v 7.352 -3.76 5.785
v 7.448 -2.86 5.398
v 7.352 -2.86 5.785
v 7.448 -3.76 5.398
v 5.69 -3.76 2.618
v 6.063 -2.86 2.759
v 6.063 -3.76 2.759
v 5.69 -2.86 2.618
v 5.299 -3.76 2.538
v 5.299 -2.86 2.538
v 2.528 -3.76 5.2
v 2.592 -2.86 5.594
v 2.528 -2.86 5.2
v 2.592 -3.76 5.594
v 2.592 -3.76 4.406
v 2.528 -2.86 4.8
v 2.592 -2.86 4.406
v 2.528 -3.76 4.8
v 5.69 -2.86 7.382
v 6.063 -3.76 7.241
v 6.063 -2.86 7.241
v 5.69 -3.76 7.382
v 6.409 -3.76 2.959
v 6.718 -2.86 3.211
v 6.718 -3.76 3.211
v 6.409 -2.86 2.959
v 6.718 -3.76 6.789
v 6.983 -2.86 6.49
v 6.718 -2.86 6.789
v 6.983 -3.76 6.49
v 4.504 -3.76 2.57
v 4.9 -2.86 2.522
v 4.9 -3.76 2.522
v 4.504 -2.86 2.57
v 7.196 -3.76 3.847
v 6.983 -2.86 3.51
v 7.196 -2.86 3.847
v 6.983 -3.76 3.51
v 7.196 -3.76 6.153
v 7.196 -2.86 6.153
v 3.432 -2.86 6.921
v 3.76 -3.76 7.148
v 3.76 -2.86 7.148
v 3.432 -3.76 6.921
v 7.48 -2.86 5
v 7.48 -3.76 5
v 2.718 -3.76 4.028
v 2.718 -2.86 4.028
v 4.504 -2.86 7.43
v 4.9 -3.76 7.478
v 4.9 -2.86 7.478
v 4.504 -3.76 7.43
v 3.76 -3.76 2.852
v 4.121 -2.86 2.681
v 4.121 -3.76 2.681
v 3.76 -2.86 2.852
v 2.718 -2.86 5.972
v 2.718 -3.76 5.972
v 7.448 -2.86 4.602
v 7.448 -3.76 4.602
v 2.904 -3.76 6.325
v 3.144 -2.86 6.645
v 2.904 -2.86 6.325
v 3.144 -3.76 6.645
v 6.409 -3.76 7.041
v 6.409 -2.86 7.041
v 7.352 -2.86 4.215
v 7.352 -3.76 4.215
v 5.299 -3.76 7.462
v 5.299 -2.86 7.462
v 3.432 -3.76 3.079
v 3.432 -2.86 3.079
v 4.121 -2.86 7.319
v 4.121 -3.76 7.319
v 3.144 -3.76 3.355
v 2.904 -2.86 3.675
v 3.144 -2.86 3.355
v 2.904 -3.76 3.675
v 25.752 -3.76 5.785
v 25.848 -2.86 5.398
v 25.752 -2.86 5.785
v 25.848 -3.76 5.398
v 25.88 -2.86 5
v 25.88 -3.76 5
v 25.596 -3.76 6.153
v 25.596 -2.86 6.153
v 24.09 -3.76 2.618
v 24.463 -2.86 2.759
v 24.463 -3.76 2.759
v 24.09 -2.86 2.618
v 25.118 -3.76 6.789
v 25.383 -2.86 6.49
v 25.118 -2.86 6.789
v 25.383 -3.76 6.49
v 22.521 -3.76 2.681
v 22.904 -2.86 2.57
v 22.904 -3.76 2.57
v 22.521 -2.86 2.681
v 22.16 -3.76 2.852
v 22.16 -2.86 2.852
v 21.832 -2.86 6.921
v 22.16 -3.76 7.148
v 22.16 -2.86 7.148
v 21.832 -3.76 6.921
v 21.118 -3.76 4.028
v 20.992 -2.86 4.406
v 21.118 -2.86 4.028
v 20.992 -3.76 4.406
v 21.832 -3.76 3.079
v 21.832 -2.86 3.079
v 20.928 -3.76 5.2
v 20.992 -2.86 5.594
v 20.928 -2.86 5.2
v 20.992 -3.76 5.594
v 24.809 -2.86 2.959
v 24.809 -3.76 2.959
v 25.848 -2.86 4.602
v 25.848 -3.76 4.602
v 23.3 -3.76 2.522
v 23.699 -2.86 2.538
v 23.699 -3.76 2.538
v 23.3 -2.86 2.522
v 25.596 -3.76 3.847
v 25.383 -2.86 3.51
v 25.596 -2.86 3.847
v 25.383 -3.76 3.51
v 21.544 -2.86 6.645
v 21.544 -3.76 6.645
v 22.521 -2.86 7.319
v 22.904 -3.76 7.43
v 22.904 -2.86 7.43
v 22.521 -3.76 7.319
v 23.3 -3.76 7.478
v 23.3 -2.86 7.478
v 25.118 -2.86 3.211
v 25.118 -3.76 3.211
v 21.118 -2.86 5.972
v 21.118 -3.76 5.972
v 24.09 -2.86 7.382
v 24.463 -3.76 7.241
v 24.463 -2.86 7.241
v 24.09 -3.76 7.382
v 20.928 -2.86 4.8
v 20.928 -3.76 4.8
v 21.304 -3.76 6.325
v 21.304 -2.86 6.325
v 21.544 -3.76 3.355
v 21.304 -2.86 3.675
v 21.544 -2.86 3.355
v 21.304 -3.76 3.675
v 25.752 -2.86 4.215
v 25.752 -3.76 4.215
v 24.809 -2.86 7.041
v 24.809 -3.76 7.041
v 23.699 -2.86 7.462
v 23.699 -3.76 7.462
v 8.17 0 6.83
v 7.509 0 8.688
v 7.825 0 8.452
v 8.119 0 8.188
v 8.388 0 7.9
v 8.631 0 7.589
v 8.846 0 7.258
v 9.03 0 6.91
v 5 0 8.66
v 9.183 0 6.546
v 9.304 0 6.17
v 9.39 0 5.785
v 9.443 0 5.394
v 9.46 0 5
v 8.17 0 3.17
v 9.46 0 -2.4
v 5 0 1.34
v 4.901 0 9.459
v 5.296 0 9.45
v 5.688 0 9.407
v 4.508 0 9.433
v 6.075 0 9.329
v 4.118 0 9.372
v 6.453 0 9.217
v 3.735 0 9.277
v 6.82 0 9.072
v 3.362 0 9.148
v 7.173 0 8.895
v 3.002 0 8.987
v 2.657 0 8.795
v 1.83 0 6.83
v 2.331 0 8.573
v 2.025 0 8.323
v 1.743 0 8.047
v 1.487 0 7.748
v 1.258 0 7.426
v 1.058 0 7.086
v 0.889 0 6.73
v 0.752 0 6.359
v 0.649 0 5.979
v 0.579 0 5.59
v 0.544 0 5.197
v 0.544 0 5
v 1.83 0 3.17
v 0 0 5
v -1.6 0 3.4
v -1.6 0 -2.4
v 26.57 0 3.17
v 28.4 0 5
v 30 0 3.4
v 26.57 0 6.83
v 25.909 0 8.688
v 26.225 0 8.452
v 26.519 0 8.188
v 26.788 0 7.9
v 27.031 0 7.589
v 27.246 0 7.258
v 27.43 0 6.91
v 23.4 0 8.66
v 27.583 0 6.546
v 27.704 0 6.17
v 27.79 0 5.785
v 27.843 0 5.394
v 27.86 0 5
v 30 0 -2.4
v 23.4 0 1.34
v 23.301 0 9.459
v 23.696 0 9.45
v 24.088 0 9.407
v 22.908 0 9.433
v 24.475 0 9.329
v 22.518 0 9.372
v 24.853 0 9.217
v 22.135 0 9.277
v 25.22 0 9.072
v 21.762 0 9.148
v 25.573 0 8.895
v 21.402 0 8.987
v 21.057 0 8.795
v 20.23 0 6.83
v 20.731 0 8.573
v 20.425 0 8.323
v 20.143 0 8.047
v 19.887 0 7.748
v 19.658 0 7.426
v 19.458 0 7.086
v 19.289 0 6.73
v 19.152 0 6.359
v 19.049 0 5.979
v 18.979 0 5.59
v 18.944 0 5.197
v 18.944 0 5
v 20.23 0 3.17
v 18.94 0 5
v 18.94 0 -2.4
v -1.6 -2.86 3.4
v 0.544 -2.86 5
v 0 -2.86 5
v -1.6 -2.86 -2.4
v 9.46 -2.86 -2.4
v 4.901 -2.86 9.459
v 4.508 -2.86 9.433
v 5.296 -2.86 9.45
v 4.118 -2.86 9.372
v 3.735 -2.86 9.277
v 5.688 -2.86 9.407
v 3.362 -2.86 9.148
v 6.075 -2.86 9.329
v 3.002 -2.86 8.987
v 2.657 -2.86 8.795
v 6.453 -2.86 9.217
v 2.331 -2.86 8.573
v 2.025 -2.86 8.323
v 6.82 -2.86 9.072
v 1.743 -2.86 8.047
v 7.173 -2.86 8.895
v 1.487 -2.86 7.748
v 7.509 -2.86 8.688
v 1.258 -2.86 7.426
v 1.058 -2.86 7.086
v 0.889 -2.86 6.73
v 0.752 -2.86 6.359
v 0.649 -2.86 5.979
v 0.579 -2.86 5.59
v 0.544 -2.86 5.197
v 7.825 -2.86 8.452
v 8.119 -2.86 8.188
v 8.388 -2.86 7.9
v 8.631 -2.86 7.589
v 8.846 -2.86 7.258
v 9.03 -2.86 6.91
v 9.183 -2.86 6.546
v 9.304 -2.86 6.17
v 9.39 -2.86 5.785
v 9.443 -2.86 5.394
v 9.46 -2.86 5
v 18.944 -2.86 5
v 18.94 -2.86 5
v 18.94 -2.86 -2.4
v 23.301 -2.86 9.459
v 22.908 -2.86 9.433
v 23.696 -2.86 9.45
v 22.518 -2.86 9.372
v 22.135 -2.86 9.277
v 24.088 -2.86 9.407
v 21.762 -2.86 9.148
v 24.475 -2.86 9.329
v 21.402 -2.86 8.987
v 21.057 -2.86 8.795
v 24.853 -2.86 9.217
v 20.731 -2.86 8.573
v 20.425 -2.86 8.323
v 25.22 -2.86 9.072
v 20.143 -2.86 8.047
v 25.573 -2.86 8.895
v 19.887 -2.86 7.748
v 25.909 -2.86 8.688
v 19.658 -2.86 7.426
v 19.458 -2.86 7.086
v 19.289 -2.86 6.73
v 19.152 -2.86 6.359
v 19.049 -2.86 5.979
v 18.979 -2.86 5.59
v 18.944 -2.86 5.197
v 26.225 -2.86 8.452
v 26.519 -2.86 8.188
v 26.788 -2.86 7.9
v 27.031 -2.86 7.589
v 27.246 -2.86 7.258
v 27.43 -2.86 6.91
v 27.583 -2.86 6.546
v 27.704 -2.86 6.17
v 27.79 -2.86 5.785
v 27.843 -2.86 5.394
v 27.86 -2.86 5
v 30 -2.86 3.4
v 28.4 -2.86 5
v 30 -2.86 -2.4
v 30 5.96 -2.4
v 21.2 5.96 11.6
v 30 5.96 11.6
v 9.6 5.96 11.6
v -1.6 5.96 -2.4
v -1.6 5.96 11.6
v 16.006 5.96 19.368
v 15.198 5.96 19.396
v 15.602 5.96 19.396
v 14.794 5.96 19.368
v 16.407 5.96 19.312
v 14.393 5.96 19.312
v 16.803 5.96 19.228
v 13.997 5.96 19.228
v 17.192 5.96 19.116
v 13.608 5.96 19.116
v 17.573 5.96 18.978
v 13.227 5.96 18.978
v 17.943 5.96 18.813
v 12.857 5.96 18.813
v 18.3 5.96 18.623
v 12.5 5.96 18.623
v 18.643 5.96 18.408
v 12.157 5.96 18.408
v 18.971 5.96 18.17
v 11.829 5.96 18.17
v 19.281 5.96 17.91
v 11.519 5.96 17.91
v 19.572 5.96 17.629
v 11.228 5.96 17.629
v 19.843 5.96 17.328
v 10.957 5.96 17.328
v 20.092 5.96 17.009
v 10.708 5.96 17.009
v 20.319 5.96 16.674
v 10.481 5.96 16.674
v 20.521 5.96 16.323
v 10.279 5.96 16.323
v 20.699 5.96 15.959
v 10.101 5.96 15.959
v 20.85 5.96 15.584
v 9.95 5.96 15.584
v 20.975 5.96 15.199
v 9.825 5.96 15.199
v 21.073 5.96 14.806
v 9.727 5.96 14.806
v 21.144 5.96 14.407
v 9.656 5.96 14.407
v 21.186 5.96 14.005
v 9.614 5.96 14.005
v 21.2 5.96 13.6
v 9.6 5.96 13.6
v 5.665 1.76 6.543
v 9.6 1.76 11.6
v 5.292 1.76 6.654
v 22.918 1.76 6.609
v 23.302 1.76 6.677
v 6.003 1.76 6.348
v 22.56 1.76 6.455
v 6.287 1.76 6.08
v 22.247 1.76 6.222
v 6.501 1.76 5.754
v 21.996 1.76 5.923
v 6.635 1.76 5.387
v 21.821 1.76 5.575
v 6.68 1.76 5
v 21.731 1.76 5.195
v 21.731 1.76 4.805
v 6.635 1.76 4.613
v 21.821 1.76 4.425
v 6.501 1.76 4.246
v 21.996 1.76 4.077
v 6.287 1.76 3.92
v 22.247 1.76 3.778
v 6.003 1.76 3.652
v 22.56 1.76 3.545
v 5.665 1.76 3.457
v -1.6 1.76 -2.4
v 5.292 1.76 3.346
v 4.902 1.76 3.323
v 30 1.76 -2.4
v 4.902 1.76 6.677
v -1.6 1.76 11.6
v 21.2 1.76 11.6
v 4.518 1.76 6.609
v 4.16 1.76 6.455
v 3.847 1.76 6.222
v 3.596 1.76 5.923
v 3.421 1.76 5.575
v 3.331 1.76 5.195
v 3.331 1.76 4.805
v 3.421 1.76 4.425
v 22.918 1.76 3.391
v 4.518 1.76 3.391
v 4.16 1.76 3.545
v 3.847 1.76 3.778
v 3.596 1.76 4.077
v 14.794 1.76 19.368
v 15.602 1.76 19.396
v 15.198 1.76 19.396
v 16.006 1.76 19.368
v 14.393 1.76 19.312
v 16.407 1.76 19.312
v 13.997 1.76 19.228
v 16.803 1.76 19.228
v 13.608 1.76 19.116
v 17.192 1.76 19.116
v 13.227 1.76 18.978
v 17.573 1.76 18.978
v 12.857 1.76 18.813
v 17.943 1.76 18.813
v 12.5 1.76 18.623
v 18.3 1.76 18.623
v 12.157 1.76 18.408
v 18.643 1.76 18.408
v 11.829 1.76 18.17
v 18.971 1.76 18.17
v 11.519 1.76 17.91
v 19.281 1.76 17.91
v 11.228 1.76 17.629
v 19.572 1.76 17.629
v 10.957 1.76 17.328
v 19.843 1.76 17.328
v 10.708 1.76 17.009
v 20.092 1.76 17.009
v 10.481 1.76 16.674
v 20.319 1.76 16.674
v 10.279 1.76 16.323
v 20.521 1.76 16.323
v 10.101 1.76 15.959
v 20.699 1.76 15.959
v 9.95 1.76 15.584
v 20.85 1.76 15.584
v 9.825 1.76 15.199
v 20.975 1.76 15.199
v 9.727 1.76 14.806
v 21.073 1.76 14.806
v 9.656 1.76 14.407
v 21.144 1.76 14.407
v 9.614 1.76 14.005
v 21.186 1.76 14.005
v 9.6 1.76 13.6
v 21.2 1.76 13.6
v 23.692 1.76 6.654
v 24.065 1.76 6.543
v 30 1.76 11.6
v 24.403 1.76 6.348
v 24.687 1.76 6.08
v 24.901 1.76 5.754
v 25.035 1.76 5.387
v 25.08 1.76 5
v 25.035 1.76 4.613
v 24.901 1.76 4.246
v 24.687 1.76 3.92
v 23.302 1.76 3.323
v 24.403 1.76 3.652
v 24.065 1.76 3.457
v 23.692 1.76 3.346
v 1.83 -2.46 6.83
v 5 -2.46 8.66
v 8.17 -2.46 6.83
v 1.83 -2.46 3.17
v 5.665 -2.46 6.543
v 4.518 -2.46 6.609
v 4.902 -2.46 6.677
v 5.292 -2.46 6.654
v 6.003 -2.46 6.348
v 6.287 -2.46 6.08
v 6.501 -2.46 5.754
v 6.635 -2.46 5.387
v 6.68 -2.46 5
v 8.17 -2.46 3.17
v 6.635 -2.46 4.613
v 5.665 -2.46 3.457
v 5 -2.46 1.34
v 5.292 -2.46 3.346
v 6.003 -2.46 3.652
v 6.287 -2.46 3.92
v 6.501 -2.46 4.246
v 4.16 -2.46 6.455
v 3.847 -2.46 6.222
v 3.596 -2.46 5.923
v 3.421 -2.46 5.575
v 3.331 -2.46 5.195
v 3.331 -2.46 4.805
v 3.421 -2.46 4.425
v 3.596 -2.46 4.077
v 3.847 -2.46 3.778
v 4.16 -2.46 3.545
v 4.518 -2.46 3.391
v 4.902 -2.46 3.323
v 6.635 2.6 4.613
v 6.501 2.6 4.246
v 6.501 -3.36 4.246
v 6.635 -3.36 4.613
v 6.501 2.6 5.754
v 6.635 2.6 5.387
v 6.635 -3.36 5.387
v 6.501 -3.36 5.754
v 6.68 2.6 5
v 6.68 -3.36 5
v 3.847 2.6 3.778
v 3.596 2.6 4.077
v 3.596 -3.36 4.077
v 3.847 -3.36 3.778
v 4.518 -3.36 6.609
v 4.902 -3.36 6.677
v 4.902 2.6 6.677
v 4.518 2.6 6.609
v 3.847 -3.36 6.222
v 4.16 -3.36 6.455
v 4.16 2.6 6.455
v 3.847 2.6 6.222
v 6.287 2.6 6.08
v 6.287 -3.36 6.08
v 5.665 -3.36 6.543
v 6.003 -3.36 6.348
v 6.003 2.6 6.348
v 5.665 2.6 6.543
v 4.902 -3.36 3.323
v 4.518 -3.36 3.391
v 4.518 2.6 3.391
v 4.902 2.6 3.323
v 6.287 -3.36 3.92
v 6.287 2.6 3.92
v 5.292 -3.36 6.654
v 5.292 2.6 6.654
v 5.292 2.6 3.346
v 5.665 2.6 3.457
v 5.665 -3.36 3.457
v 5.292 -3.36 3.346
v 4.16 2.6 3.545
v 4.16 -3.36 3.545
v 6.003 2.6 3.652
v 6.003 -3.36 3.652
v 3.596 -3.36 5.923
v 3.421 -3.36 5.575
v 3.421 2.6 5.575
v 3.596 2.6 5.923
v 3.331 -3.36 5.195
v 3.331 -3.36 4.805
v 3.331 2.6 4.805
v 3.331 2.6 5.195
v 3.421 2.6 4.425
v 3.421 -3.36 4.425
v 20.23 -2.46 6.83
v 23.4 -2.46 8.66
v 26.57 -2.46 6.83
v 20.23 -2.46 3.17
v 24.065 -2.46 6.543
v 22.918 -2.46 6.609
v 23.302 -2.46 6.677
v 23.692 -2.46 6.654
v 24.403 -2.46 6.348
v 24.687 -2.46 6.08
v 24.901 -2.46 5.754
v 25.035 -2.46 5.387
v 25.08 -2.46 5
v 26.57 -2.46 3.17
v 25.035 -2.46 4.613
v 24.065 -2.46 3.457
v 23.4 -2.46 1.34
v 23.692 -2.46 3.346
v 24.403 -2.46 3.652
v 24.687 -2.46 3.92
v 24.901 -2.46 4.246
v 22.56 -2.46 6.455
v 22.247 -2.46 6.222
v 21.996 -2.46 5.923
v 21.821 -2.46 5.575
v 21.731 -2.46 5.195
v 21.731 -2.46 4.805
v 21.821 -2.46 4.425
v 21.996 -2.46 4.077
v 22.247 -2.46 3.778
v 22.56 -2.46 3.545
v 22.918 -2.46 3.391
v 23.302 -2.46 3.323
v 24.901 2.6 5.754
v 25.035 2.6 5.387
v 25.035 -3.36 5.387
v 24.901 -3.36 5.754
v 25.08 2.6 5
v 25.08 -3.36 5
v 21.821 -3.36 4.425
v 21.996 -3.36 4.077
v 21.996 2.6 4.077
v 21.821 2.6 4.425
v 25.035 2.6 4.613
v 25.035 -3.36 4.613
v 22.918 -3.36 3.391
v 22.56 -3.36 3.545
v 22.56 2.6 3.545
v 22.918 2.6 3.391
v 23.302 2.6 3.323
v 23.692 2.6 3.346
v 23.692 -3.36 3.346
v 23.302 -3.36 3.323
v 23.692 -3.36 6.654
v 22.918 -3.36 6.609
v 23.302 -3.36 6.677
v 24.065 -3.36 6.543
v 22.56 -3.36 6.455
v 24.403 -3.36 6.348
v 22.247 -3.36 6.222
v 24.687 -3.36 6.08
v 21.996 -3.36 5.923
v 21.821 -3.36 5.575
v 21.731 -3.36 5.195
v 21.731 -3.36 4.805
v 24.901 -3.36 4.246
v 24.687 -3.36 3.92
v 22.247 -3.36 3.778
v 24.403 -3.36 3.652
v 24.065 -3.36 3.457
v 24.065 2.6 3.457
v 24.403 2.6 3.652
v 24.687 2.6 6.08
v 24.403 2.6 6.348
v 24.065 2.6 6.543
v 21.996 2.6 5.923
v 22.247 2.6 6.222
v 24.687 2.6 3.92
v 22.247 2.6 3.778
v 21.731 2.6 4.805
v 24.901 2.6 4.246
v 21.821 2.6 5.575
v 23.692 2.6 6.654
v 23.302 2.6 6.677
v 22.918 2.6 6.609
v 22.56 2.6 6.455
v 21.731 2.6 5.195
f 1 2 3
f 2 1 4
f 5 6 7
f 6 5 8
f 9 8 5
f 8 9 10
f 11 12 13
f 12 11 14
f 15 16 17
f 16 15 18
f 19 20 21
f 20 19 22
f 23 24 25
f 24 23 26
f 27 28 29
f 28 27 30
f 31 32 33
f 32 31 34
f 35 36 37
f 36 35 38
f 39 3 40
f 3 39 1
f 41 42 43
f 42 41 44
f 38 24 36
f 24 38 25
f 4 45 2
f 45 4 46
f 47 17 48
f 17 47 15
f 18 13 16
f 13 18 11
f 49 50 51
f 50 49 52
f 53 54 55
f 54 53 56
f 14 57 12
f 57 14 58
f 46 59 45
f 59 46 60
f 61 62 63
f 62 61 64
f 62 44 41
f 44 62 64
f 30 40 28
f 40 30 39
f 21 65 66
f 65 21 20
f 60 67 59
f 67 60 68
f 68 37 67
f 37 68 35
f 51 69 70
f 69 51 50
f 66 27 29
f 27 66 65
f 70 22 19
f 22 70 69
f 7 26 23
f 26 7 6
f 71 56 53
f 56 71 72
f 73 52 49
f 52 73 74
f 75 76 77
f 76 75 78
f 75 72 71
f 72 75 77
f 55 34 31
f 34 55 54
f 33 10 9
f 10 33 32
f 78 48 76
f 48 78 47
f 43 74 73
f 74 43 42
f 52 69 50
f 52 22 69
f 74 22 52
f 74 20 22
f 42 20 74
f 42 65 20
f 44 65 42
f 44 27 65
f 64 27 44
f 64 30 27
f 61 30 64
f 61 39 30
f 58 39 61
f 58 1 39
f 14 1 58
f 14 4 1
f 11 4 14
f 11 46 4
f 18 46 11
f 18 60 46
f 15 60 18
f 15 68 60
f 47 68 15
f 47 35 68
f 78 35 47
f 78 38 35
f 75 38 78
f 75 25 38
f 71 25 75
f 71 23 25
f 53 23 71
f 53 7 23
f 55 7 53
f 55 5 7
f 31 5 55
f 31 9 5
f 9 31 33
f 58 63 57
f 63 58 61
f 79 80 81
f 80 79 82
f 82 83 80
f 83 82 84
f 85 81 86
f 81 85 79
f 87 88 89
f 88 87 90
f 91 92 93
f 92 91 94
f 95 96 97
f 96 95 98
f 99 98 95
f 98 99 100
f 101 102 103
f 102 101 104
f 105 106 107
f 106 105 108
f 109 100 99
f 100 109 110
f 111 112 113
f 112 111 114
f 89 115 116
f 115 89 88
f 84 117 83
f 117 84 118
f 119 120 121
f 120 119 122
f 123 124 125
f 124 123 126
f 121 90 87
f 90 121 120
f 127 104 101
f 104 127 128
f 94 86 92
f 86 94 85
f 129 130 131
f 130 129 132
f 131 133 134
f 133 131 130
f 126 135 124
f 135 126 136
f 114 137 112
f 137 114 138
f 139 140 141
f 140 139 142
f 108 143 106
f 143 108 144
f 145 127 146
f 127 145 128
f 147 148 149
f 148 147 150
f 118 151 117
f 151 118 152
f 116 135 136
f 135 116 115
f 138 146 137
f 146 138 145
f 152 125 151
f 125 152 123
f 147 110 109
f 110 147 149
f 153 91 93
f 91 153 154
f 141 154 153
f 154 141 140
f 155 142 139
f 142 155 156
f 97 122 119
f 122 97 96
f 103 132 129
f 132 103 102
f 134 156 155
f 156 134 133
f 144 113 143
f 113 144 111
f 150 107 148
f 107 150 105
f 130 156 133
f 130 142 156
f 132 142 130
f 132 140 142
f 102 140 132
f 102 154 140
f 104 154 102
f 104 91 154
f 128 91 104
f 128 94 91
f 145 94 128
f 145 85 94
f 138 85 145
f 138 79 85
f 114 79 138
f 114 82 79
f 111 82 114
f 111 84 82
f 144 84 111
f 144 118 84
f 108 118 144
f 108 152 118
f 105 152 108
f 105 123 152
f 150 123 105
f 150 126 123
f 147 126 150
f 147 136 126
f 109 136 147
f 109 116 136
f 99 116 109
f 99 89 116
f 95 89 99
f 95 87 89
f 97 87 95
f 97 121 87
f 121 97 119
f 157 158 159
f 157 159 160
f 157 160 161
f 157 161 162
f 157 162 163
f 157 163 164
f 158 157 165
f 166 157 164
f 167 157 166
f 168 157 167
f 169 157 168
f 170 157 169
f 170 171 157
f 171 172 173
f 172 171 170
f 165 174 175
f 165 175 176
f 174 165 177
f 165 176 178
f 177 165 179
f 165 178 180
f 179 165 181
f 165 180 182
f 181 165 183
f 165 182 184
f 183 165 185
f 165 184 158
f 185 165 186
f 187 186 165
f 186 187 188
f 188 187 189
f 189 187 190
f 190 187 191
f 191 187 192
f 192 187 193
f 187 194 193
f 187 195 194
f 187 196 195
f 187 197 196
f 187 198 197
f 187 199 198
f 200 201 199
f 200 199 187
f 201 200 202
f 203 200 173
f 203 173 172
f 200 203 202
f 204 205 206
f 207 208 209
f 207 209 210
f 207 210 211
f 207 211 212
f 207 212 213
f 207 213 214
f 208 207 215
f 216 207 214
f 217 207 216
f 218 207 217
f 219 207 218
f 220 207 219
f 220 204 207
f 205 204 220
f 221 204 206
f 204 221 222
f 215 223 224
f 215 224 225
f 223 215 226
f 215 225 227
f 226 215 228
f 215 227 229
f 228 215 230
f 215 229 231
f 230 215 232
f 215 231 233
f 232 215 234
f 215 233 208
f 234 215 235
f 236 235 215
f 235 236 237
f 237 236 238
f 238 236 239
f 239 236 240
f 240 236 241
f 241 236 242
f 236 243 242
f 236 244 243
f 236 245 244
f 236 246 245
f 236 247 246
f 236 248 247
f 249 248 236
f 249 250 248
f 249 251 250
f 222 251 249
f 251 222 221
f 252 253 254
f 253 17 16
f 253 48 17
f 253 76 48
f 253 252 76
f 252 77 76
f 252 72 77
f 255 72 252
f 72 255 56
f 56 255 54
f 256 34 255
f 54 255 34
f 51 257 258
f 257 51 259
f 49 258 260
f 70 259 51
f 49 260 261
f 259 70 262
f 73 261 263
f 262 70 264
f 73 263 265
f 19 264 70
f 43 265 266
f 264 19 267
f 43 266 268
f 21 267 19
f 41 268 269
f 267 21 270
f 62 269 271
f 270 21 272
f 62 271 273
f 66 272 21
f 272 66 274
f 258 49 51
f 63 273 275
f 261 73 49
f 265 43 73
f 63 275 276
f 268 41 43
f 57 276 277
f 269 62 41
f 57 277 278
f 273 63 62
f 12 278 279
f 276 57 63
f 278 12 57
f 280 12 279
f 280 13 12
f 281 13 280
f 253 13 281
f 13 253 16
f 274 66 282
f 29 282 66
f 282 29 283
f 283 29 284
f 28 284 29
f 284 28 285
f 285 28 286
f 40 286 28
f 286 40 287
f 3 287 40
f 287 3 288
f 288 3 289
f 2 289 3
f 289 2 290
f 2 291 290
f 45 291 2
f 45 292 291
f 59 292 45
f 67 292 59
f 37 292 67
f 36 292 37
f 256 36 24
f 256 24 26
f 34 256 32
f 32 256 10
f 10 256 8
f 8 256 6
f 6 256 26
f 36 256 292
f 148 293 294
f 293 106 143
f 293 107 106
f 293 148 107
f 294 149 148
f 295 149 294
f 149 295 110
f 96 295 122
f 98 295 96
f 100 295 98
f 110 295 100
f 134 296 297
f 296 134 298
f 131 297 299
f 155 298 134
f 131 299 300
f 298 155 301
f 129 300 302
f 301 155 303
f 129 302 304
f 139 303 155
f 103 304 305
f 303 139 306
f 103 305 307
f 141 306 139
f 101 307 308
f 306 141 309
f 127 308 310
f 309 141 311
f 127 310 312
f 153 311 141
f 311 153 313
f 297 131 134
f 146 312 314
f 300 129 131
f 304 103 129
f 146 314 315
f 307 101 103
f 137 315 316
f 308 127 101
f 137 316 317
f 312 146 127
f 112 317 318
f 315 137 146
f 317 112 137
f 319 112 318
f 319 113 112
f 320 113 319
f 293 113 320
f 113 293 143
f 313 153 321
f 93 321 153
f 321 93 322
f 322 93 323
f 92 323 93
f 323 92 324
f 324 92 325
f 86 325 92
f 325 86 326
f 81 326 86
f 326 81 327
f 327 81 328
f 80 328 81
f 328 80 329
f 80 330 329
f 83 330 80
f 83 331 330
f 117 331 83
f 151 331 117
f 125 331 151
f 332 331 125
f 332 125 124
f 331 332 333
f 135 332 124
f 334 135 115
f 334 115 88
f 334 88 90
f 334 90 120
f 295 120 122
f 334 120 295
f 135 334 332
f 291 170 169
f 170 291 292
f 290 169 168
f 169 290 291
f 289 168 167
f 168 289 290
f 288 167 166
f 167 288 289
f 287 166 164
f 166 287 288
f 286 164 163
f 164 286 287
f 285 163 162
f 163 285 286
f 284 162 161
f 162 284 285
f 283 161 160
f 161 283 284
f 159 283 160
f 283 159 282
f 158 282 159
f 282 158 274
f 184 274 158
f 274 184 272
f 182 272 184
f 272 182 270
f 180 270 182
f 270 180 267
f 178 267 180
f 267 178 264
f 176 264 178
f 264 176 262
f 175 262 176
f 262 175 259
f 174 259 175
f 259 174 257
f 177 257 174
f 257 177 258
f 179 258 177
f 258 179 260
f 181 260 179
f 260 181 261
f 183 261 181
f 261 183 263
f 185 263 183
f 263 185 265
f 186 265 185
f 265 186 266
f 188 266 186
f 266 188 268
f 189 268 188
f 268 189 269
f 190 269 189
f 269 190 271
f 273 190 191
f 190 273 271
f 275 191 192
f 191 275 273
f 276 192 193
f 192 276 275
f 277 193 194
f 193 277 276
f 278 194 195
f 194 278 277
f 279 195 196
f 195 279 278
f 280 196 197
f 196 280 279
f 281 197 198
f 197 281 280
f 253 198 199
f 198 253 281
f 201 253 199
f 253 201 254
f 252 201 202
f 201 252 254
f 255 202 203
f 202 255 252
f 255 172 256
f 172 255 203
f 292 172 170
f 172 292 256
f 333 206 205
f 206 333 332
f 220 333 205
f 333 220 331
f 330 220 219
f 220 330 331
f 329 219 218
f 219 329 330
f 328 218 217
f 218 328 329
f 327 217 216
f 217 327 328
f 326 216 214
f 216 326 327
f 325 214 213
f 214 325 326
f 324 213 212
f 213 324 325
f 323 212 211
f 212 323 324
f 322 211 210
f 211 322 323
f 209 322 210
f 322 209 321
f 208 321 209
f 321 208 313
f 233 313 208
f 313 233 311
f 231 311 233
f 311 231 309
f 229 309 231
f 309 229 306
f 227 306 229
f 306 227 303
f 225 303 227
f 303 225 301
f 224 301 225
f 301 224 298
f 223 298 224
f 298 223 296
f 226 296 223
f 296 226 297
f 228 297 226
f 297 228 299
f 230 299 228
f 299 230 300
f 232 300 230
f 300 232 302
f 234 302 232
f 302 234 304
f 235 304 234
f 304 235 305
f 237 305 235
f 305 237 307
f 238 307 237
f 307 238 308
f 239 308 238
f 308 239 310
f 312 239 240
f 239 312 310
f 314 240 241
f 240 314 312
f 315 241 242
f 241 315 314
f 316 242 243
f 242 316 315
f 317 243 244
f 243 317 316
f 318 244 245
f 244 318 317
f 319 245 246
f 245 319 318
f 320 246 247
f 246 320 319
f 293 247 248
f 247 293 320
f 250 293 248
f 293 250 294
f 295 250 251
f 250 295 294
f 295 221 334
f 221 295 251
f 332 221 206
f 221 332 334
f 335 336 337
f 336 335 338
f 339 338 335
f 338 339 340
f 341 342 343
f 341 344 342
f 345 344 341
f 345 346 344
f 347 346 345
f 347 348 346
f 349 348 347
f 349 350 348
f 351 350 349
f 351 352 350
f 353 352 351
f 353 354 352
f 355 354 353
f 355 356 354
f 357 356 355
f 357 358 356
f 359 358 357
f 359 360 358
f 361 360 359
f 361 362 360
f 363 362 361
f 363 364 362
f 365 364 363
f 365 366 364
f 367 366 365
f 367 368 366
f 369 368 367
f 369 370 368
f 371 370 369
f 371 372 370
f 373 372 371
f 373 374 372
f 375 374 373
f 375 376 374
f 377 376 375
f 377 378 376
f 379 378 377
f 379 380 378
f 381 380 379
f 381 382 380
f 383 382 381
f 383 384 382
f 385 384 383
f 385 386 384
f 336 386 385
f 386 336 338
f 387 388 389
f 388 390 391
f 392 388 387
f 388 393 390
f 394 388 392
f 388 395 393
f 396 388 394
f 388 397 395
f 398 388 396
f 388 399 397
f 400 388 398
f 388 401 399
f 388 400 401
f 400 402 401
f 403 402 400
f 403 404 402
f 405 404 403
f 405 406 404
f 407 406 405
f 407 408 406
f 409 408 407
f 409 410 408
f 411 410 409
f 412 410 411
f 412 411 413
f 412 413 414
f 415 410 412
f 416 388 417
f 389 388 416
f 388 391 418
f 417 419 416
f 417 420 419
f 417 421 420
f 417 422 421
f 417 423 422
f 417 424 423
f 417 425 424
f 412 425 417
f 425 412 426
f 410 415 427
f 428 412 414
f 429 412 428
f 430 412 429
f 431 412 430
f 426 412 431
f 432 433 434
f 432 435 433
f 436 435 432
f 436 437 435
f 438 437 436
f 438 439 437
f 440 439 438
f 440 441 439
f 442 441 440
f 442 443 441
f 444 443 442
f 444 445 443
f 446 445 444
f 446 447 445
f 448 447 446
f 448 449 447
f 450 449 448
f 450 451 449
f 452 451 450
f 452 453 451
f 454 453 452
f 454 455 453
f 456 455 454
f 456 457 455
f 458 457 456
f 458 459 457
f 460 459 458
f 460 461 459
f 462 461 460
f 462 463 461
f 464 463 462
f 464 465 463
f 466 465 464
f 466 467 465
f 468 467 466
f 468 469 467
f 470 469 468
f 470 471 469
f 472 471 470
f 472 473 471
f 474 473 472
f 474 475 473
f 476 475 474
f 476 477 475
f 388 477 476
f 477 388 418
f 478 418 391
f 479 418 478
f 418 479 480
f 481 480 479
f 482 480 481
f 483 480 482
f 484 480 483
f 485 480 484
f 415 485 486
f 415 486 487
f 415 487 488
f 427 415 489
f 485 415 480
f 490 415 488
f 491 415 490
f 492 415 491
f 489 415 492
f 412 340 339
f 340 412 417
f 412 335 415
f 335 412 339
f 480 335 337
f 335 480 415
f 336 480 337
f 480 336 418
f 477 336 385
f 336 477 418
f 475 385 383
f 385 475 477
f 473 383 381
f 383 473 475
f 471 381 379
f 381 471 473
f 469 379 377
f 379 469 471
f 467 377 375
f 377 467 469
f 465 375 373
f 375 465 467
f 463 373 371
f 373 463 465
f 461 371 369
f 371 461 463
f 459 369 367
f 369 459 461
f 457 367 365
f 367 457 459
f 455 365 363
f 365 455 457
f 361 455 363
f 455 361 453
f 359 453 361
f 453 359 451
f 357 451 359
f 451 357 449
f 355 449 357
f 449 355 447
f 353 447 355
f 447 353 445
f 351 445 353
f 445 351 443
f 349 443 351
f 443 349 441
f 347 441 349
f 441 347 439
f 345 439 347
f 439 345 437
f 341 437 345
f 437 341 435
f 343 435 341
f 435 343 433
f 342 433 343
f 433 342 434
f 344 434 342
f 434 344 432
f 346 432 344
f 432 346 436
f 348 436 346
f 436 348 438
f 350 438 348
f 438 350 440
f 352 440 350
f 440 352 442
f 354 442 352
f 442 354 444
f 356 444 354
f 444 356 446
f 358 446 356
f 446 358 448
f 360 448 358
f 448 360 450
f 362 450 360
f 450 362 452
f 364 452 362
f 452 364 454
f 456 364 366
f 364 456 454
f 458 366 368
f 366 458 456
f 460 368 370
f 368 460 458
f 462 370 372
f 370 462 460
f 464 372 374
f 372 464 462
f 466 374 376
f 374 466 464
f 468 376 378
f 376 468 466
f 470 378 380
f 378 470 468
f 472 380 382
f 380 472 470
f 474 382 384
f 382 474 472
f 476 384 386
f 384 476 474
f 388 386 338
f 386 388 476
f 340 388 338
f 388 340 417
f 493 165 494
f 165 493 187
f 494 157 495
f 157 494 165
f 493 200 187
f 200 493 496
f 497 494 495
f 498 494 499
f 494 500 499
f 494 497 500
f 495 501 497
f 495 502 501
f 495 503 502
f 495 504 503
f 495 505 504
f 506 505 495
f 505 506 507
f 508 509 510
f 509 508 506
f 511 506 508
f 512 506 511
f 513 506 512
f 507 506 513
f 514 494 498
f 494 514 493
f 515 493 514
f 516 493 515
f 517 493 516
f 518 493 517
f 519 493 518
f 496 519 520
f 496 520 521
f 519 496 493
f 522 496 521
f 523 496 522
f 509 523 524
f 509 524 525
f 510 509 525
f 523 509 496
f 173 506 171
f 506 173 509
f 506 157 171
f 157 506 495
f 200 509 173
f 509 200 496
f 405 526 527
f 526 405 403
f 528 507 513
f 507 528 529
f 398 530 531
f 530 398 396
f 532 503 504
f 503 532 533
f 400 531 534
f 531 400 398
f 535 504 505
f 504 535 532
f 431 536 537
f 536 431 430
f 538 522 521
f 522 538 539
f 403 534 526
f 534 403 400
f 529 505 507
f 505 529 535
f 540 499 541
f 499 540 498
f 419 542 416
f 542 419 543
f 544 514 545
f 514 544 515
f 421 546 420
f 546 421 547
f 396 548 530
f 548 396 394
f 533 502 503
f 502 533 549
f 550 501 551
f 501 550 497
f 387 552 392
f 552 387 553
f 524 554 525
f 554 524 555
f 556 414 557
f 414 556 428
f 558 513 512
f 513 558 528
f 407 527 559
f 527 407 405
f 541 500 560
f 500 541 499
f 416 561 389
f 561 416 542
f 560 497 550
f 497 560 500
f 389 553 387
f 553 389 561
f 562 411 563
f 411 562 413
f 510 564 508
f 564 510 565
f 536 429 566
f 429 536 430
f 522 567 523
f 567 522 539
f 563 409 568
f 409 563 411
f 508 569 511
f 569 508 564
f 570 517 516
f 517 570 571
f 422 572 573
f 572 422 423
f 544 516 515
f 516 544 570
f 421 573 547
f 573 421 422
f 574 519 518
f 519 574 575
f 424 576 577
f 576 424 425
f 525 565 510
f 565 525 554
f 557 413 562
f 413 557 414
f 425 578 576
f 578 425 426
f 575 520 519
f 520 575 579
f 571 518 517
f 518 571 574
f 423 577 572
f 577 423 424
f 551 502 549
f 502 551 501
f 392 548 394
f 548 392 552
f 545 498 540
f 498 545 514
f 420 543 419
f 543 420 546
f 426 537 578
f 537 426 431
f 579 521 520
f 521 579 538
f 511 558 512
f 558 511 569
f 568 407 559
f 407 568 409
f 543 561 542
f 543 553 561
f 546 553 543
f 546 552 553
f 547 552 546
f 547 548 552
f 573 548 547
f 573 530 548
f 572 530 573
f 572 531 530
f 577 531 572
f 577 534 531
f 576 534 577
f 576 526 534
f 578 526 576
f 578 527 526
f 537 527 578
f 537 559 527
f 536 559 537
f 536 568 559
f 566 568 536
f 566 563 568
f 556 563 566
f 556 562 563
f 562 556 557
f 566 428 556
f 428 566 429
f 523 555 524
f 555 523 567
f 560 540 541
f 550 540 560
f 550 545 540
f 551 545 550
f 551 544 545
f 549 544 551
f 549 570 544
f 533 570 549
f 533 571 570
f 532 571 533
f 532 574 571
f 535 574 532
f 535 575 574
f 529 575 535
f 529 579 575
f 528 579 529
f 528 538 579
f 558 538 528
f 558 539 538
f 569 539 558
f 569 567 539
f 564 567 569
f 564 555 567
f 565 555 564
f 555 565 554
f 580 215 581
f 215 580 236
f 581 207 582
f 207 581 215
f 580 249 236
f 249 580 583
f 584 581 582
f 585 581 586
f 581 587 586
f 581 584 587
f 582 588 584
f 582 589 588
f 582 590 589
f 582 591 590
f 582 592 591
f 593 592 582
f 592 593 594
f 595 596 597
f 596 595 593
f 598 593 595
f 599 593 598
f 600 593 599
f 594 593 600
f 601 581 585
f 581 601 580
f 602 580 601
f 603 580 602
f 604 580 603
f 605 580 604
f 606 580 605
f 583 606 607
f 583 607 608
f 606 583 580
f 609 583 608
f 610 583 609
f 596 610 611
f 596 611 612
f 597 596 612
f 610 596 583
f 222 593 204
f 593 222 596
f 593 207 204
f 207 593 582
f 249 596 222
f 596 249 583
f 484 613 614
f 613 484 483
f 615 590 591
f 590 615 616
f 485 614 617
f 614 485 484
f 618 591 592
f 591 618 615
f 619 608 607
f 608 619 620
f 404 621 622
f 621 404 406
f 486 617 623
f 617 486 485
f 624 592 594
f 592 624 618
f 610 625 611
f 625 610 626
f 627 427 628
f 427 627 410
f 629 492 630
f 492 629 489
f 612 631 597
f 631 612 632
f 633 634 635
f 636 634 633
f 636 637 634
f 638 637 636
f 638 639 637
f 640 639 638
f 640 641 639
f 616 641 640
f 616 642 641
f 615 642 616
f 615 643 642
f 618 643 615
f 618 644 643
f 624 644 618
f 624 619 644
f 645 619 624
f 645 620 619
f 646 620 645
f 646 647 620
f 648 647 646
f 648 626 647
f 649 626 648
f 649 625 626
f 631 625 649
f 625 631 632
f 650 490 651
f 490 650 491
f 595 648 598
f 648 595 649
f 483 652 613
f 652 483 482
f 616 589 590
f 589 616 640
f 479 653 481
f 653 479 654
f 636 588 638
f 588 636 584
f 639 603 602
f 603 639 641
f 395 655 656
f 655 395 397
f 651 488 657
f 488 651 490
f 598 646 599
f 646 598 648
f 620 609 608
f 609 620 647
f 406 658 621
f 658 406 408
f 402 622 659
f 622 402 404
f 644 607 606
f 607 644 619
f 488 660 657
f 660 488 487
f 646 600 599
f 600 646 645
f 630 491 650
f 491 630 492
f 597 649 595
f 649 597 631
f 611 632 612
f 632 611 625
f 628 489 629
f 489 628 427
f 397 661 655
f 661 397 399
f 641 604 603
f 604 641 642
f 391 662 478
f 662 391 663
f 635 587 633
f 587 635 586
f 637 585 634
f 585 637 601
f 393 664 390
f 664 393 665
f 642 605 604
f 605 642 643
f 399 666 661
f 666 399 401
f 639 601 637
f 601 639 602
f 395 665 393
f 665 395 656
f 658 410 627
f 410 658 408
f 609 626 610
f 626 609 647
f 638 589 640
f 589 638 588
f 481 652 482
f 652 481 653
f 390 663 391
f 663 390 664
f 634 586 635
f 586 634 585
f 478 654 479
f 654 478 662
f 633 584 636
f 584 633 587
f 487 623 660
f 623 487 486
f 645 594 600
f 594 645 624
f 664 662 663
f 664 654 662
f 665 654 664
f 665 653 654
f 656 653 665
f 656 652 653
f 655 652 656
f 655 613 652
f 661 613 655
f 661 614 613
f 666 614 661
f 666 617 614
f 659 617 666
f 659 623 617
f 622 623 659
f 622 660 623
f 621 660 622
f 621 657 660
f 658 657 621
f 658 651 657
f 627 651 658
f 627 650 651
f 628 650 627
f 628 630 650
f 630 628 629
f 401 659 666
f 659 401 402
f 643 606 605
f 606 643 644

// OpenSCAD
// Copyright (C) 2025 Arif K. Rafiq
// This program is free software: you can redistribute it and/or modify
// it under the terms of the GNU General Public License as published by
// the Free Software Foundation, either version 3 of the License, or
// (at your option) any later version.

// This program is distributed in the hope that it will be useful,
// but WITHOUT ANY WARRANTY; without even the implied warranty of
// MERCHANTABILITY or FITNESS FOR A PARTICULAR PURPOSE.  See the
// GNU General Public License for more details.

// You should have received a copy of the GNU General Public License
// along with this file.  If not, see <https://www.gnu.org/licenses/>,
// or write to: license@temperedoptimism.com


/* 
(b)readth       :(w)est (X-)   (c)enter (X0) (e)east (X+)
(h)eight        :(d)own (Z-)   (g)round(Z0)  (u)p (Z+)

Vectors (v)     :(x), (y), (z)
Thicknesses (t) : Thicknesses to resolve 3D printer limits or rendering issues.
Proportion (p)  : container for grouping (r)adius and (i)ntensity into a singl 2d vector acccessed using .x and .y respectively
*/
/* 17:08 */
// Fixed in example3.scad       // Set limits in customizer
/* [Thicknesses (x),(y),(z)] */
tFitGap = [0.16, 0.16, 0.16];   //[0.00:0.01:0.64] 
tWallMin = [0.40, 0.40, 0.16];  //[0.16:0.08:1.60] 
/* [Proportional (x):(Radius, (y):(i)ntensity] */
pHexSink = [3.5, 2.3];          //[0.10:0.02:20.00] 
pFastShaft = [1.36, 5.80]; //0.10:0.02:20.00]
pWashSink = [4.00, 1.00]; //0.10:0.02:20.00]
/* [2D vectors (x), (y)] */
vTerminalW = [5.0, 5.0];     //[0.00:0.10:100] 
vTerminalE = [23.4, 5.0];    //[0.00:0.10:100]
vThermal = [ 15.4, 13.6];    //[0.00:0.10:100.00]
/* [Scalars] */
leadingEdge = 2.4; //[0.8:0.4:5.0]
flankEdge = 1.6; //[0.8:0.4:5.0]
trailingEdge = 1.6; //[0.8:0.4:3.6]
bBoard = 28.4; //[20:0.1:100.0]
hBoard = 1.6; //0.8:04:3.2]
// Adding space
hSpacer = 4.2; //[2.8:0.4:14]
rCorner = 1.6; //0.1
rTerminal = 5.0; //0.1
rThermal = 5.0;  //0.1
/* [Special ] */
fa0 = 4.0;     //[1:1:60]  
fs0 = 0.4;     //[0.1:0.1:4.0]  
fx0 = 3;       //[1,2,3,4,5,6,7,8,9,10]
/* [Hidden] */ 
tEps=0.01; 

/* Calucualted at run time. */
pHexSurround = [pHexSink.x + (tWallMin.x * 2) + tFitGap.x, pHexSink.y + tWallMin.y + tFitGap.y];
pExtension = [pFastShaft.x + ((tWallMin.x + tFitGap.x)* 2), pFastShaft.y + tWallMin.y + tFitGap.y - pHexSurround.y -hBoard - pWashSink.y];

//30.00-35.00 Circles, Also look at the customizer!!
// Rotate
rotate([90,0,0]){
  difference(){
    union() {
      // hex pocket surround
      linear_extrude(pHexSurround.y, convexity=fx0){ 
        polygon([[vTerminalW.x + pHexSurround.x, vTerminalW.y],
              [ vTerminalW.x + pHexSurround.x, -leadingEdge],
              [-flankEdge, -leadingEdge],
              [-flankEdge, vTerminalW.y - rCorner],
              [-flankEdge + rCorner, vTerminalW.y]]);
        polygon([[vTerminalE.x - pHexSurround.x, vTerminalE.y],
              [ vTerminalE.x - pHexSurround.x, -leadingEdge],
              [bBoard + flankEdge, -leadingEdge],
              [bBoard + flankEdge, vTerminalE.y - rCorner],
              [bBoard + flankEdge - rCorner, vTerminalE.y]]);       
              
        for(v = [vTerminalW, vTerminalE]){
          translate(v)  circle(pHexSurround.x, $fa=fa0, $fs=fs0 );
        }
      }
      // shaft extension
      for(v= [vTerminalW, vTerminalE]){
          translate([v.x, v.y, pHexSurround.y - tEps]) cylinder(pExtension.y + tEps, r=pExtension.x, $fa=fa0, $fs=fs0);
      }
      // board spacer
      translate([0, 0, -hBoard - tFitGap.y - hSpacer]) linear_extrude(hSpacer, convexity=fx0){
          polygon([[-flankEdge, -leadingEdge],
            [bBoard + flankEdge, -leadingEdge],
            [bBoard + flankEdge, vTerminalE.y + rTerminal + trailingEdge],
            [vThermal.x + rThermal +(tWallMin.x * 2), vTerminalE.y + rTerminal + trailingEdge],
            [vThermal.x + rThermal +(tWallMin.x * 2), vThermal.y],
            [vThermal.x - rThermal -(tWallMin.x * 2), vThermal.y],
           [vThermal.x - rThermal -(tWallMin.x * 2), vTerminalW.y + rTerminal + trailingEdge],
           [-flankEdge, vTerminalW.y + rTerminal + trailingEdge]]);
          translate(vThermal) circle(rThermal + (tWallMin.x * 2), $fa=fa0, $fs=fs0);
      }
          
    }
    for(v = [vTerminalW, vTerminalE]){
        // hex pocket
        #translate([v.x, v.y, -tEps]) rotate([0,0,30]) cylinder(pHexSurround.y - tWallMin.y + tEps, r=pHexSurround.x - (tWallMin.x * 2), $fn=6);
        // fastner hole
        #translate([v.x, v.y, -hBoard -pWashSink.y]) cylinder(pFastShaft.y + tFitGap.y, r=pFastShaft.x + (tFitGap.x * 2), $fa=fa0, $fs=fs0);
    }
  }
}
